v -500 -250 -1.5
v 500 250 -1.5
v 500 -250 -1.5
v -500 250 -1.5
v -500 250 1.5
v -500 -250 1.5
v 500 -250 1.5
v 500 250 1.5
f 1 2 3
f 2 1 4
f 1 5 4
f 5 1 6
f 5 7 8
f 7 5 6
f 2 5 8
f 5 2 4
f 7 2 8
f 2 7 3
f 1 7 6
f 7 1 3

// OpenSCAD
// Sheet DiBond (plain single connected solid)

// Parameters
sheet_length = 1000; //[500:2000:1]
sheet_width = 500; //[250:1000:1]
sheet_thickness = 3; //[1.5:6:0.5]
corner_radius = 0; //[0:50:1]
edge_chamfer = 0; //[0:5:0.5]

// Plain sheet request: no holes/markers by default
mount_hole_diameter = 6; //[2:20:0.5]
mount_hole_edge_offset = 20; //[5:100:1]
mount_hole_count = 0; //[0:4:1]
marking_depth = 0; //[0:1:0.1]
marking_margin = 30; //[5:150:1]

overlap = 0.5; //[0.1:2:0.1]

$fn = 96;

// Helpers
function clamp(v, lo, hi) = v < lo ? lo : (v > hi ? hi : v);

r_eff  = clamp(corner_radius, 0, min(sheet_length, sheet_width)/2);
ch_eff = clamp(edge_chamfer, 0, min(sheet_length, sheet_width, sheet_thickness)/2);
hole_r = mount_hole_diameter/2;

// 2D rounded rectangle
module rounded_rect_2d(L, W, R) {
  R2 = clamp(R, 0, min(L, W)/2);
  if (R2 <= 0) {
    square([L, W], center=true);
  } else {
    hull() {
      for (sx = [-1, 1], sy = [-1, 1])
        translate([sx*(L/2 - R2), sy*(W/2 - R2)]) circle(r=R2);
    }
  }
}

// Base sheet (extruded 2D profile)
module sheet_solid() {
  linear_extrude(height=sheet_thickness, center=true)
    rounded_rect_2d(sheet_length, sheet_width, r_eff);
}

// Optional mounting holes (through)
module mounting_holes() {
  x = sheet_length/2 - mount_hole_edge_offset;
  y = sheet_width/2  - mount_hole_edge_offset;

  if (mount_hole_count == 4 && x > hole_r && y > hole_r) {
    for (sx = [-1, 1], sy = [-1, 1])
      translate([sx*x, sy*y, 0])
        cylinder(r=hole_r, h=sheet_thickness + 2*overlap, center=true);
  }
}

// Optional surface marking (shallow pocket on top face)
module surface_marking() {
  Lm = sheet_length - 2*marking_margin;
  Wm = sheet_width  - 2*marking_margin;

  if (marking_depth > 0 && Lm > 0 && Wm > 0) {
    translate([0, 0, sheet_thickness/2 - marking_depth/2])
      linear_extrude(height=marking_depth + overlap, center=true)
        rounded_rect_2d(Lm, Wm, max(r_eff - marking_margin, 0));
  }
}

// Optional edge chamfer (simple bevel approximation via hull of two profiles)
module chamfered_sheet() {
  if (ch_eff <= 0) {
    sheet_solid();
  } else {
    // Ensure valid inner dimensions
    L2 = max(sheet_length - 2*ch_eff, 0.01);
    W2 = max(sheet_width  - 2*ch_eff, 0.01);
    R2 = max(r_eff - ch_eff, 0);

    hull() {
      // Bottom face profile (full size)
      translate([0, 0, -sheet_thickness/2])
        linear_extrude(height=0.01, center=false)
          rounded_rect_2d(sheet_length, sheet_width, r_eff);

      // Top face profile (shrunk by chamfer amount)
      translate([0, 0,  sheet_thickness/2])
        linear_extrude(height=0.01, center=false)
          rounded_rect_2d(L2, W2, R2);
    }
  }
}

// Final Model (single connected solid)
module complete_model() {
  difference() {
    chamfered_sheet();
    mounting_holes();
    surface_marking();
  }
}

// Render
color([0.75, 0.75, 0.77]) complete_model();
